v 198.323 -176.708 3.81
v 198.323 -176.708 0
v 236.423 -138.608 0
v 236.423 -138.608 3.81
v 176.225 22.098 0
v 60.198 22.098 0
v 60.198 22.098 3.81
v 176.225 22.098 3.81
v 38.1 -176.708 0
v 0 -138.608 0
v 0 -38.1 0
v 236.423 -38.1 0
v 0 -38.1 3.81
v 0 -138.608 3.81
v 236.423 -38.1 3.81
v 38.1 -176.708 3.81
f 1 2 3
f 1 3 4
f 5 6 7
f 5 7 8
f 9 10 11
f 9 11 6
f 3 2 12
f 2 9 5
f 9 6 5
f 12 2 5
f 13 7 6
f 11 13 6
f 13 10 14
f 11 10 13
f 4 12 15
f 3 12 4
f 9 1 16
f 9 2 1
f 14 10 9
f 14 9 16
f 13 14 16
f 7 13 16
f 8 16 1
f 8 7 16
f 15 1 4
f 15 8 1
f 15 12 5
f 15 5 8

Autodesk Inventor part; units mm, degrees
ref_plane "YZ Plane" through (0, 0, 0) normal (1, 0, 0) x (0, 1, 0)
ref_plane "XZ Plane" through (0, 0, 0) normal (0, 1, 0) x (-1, 0, 0)
ref_plane "XY Plane" through (0, 0, 0) normal (0, 0, 1) x (1, 0, 0)
sketch "Sketch1" plane through (0, 0, 0) normal (0, 0, 1) x (1, 0, 0)
  line L0 (0, 0) -> (236.4232, 0)
  line L1 (236.4232, 0) -> (236.4232, -176.7078)
  line L2 (236.4232, -176.7078) -> (0, -176.7078)
  line L3 (0, -176.7078) -> (0, 0)
  dimension "d0" = 236.4232
  dimension "d1" = 176.7078
extrude "Extrusion1" add sketch "Sketch1" along normal blind 3.81
chamfer "Chamfer1" distance 38.1 angle 45 1 edges at (236.4232, 0, 1.905)
chamfer "Chamfer2" distance 38.1 angle 45 1 edges at (0, 0, 1.905)
chamfer "Chamfer3" distance 38.1 angle 45 1 edges at (236.4232, -176.7078, 1.905)
chamfer "Chamfer4" distance 38.1 angle 45 1 edges at (0, -176.7078, 1.905)
move faces "Move1" translate (0, 22.098, 0) faces at (91.5077, 0, 1.27)
sketch "Sketch2" plane through (198.3232, -176.7078, 0) normal (0, -1, 0) x (1, 0, 0)
  point P0 (-198.3232, 0)
properties part number "ElectronicsPlate2"
